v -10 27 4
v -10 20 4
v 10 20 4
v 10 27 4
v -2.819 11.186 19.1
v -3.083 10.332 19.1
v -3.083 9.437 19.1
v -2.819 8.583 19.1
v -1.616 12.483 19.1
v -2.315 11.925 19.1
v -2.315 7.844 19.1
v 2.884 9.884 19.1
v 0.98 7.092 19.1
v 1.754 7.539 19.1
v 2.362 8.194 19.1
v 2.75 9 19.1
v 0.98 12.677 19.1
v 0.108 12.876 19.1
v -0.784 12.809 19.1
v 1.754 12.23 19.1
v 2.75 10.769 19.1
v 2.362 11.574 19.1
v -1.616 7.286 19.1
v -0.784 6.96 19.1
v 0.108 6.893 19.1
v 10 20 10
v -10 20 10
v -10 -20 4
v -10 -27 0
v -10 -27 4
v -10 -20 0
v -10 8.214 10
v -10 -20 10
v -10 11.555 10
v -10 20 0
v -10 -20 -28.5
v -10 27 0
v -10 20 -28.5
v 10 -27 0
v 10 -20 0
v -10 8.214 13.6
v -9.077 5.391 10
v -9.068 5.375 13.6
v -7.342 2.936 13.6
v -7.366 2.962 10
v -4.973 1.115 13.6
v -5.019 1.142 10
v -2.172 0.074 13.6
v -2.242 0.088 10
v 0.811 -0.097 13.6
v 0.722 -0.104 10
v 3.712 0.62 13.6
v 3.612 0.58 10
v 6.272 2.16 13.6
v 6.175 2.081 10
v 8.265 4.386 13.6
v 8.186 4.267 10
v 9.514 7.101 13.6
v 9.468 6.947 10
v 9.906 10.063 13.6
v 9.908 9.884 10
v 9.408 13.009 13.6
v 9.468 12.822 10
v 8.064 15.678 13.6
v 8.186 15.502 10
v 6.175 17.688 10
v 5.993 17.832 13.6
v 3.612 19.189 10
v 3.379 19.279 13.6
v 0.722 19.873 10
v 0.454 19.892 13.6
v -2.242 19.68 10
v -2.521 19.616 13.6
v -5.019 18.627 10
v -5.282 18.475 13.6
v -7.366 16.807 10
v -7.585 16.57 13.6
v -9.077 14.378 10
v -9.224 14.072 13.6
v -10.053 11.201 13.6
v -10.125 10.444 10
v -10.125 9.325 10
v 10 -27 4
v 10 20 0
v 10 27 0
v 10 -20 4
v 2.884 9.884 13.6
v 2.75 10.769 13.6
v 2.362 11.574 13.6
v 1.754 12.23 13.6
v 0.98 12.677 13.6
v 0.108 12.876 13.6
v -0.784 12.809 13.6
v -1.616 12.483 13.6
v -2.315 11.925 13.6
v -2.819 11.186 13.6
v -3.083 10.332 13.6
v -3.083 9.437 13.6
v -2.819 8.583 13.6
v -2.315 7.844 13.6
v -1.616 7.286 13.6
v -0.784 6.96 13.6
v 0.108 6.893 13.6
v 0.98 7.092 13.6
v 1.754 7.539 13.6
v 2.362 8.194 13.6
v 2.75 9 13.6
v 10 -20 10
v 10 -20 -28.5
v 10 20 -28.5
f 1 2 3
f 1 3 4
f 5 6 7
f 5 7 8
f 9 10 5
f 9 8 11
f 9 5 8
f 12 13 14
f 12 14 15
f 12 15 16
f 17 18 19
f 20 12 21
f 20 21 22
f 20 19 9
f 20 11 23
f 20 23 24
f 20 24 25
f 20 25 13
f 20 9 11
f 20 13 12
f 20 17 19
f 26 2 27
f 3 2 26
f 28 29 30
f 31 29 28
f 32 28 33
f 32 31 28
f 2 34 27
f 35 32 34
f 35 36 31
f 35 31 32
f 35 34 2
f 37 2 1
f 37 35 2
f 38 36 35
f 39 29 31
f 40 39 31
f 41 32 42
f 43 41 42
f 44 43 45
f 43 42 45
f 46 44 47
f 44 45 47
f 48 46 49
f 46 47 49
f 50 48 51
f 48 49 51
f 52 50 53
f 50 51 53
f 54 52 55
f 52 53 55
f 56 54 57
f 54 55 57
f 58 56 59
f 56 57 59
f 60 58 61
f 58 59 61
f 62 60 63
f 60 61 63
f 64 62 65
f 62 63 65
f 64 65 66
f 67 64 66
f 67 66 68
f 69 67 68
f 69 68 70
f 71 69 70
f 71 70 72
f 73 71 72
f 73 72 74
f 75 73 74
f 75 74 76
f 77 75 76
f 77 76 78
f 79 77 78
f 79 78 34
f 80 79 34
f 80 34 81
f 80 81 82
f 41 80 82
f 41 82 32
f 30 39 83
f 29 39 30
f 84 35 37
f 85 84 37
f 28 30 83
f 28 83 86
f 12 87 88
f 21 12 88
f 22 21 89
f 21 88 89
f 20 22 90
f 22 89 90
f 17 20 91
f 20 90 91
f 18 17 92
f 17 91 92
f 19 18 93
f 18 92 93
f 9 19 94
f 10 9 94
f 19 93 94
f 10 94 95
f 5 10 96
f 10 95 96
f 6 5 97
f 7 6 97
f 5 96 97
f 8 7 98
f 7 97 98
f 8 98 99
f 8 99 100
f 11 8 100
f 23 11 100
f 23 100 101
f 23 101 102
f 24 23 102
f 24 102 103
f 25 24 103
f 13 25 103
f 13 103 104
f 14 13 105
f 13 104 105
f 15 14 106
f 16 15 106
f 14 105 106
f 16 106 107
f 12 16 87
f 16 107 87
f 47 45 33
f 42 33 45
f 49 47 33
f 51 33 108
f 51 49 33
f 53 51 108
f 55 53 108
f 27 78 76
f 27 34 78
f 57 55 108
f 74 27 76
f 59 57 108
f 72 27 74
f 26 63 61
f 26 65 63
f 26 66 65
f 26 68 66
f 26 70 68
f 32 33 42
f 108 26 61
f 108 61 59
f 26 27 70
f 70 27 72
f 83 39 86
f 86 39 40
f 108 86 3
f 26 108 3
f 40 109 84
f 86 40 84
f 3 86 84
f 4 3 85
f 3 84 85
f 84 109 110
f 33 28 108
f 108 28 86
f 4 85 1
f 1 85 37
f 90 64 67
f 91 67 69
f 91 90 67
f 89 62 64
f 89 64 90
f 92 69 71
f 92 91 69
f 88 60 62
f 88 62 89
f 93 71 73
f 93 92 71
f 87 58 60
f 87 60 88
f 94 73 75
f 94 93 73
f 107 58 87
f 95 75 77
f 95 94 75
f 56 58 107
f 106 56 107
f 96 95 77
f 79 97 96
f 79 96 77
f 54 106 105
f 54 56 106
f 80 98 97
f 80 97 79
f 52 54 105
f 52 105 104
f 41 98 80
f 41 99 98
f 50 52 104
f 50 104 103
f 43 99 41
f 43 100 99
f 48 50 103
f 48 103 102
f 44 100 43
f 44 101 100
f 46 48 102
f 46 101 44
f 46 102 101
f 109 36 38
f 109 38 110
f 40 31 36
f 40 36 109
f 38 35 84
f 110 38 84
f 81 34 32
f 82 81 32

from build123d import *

# Parameters (mm, degrees)
CROQUIS1_W              = 54
CROQUIS1_H              = 20
SALIENTE_EXTRUIR1_DEPTH = 4
CROQUIS2_W              = 20
CROQUIS2_H              = 40
SALIENTE_EXTRUIR2_DEPTH = 6
CROQUIS3_R              = 10.02395417
SALIENTE_EXTRUIR3_DEPTH = 3.6
CROQUIS4_R              = 3
SALIENTE_EXTRUIR4_DEPTH = 5.5
CROQUIS5_W              = 20
CROQUIS5_H              = 40
SALIENTE_EXTRUIR5_DEPTH = 28.5


with BuildPart() as part:
    # Croquis1 → Saliente-Extruir1 (new body)
    with BuildSketch(Plane(origin=(0, 0, 0), x_dir=(0, 1, 0), z_dir=(0, 0, 1))):
        Rectangle(CROQUIS1_W, CROQUIS1_H)
    extrude(amount=SALIENTE_EXTRUIR1_DEPTH)

    # Croquis2 → Saliente-Extruir2 (add)
    with BuildSketch(Plane.XY.offset(4)):
        Rectangle(CROQUIS2_W, CROQUIS2_H)
    extrude(amount=SALIENTE_EXTRUIR2_DEPTH)

    # Croquis3 → Saliente-Extruir3 (add)
    with BuildSketch(Plane.XY.offset(10)):
        with Locations(Location((-0.116229886, 9.884437844, 0), (0, 0, 189.593450482))):
            Circle(CROQUIS3_R)
    extrude(amount=SALIENTE_EXTRUIR3_DEPTH)

    # Croquis4 → Saliente-Extruir4 (add)
    with BuildSketch(Plane.XY.offset(13.6)):
        with Locations((-0.116229886, 9.884437844)):
            Circle(CROQUIS4_R)
    extrude(amount=SALIENTE_EXTRUIR4_DEPTH)

    # Croquis5 → Saliente-Extruir5 (add)
    with BuildSketch(Plane(origin=(0, 0, 0), x_dir=(1, 0, 0), z_dir=(0, 0, -1))):
        Rectangle(CROQUIS5_W, CROQUIS5_H)
    extrude(amount=SALIENTE_EXTRUIR5_DEPTH)


solid = part.part
